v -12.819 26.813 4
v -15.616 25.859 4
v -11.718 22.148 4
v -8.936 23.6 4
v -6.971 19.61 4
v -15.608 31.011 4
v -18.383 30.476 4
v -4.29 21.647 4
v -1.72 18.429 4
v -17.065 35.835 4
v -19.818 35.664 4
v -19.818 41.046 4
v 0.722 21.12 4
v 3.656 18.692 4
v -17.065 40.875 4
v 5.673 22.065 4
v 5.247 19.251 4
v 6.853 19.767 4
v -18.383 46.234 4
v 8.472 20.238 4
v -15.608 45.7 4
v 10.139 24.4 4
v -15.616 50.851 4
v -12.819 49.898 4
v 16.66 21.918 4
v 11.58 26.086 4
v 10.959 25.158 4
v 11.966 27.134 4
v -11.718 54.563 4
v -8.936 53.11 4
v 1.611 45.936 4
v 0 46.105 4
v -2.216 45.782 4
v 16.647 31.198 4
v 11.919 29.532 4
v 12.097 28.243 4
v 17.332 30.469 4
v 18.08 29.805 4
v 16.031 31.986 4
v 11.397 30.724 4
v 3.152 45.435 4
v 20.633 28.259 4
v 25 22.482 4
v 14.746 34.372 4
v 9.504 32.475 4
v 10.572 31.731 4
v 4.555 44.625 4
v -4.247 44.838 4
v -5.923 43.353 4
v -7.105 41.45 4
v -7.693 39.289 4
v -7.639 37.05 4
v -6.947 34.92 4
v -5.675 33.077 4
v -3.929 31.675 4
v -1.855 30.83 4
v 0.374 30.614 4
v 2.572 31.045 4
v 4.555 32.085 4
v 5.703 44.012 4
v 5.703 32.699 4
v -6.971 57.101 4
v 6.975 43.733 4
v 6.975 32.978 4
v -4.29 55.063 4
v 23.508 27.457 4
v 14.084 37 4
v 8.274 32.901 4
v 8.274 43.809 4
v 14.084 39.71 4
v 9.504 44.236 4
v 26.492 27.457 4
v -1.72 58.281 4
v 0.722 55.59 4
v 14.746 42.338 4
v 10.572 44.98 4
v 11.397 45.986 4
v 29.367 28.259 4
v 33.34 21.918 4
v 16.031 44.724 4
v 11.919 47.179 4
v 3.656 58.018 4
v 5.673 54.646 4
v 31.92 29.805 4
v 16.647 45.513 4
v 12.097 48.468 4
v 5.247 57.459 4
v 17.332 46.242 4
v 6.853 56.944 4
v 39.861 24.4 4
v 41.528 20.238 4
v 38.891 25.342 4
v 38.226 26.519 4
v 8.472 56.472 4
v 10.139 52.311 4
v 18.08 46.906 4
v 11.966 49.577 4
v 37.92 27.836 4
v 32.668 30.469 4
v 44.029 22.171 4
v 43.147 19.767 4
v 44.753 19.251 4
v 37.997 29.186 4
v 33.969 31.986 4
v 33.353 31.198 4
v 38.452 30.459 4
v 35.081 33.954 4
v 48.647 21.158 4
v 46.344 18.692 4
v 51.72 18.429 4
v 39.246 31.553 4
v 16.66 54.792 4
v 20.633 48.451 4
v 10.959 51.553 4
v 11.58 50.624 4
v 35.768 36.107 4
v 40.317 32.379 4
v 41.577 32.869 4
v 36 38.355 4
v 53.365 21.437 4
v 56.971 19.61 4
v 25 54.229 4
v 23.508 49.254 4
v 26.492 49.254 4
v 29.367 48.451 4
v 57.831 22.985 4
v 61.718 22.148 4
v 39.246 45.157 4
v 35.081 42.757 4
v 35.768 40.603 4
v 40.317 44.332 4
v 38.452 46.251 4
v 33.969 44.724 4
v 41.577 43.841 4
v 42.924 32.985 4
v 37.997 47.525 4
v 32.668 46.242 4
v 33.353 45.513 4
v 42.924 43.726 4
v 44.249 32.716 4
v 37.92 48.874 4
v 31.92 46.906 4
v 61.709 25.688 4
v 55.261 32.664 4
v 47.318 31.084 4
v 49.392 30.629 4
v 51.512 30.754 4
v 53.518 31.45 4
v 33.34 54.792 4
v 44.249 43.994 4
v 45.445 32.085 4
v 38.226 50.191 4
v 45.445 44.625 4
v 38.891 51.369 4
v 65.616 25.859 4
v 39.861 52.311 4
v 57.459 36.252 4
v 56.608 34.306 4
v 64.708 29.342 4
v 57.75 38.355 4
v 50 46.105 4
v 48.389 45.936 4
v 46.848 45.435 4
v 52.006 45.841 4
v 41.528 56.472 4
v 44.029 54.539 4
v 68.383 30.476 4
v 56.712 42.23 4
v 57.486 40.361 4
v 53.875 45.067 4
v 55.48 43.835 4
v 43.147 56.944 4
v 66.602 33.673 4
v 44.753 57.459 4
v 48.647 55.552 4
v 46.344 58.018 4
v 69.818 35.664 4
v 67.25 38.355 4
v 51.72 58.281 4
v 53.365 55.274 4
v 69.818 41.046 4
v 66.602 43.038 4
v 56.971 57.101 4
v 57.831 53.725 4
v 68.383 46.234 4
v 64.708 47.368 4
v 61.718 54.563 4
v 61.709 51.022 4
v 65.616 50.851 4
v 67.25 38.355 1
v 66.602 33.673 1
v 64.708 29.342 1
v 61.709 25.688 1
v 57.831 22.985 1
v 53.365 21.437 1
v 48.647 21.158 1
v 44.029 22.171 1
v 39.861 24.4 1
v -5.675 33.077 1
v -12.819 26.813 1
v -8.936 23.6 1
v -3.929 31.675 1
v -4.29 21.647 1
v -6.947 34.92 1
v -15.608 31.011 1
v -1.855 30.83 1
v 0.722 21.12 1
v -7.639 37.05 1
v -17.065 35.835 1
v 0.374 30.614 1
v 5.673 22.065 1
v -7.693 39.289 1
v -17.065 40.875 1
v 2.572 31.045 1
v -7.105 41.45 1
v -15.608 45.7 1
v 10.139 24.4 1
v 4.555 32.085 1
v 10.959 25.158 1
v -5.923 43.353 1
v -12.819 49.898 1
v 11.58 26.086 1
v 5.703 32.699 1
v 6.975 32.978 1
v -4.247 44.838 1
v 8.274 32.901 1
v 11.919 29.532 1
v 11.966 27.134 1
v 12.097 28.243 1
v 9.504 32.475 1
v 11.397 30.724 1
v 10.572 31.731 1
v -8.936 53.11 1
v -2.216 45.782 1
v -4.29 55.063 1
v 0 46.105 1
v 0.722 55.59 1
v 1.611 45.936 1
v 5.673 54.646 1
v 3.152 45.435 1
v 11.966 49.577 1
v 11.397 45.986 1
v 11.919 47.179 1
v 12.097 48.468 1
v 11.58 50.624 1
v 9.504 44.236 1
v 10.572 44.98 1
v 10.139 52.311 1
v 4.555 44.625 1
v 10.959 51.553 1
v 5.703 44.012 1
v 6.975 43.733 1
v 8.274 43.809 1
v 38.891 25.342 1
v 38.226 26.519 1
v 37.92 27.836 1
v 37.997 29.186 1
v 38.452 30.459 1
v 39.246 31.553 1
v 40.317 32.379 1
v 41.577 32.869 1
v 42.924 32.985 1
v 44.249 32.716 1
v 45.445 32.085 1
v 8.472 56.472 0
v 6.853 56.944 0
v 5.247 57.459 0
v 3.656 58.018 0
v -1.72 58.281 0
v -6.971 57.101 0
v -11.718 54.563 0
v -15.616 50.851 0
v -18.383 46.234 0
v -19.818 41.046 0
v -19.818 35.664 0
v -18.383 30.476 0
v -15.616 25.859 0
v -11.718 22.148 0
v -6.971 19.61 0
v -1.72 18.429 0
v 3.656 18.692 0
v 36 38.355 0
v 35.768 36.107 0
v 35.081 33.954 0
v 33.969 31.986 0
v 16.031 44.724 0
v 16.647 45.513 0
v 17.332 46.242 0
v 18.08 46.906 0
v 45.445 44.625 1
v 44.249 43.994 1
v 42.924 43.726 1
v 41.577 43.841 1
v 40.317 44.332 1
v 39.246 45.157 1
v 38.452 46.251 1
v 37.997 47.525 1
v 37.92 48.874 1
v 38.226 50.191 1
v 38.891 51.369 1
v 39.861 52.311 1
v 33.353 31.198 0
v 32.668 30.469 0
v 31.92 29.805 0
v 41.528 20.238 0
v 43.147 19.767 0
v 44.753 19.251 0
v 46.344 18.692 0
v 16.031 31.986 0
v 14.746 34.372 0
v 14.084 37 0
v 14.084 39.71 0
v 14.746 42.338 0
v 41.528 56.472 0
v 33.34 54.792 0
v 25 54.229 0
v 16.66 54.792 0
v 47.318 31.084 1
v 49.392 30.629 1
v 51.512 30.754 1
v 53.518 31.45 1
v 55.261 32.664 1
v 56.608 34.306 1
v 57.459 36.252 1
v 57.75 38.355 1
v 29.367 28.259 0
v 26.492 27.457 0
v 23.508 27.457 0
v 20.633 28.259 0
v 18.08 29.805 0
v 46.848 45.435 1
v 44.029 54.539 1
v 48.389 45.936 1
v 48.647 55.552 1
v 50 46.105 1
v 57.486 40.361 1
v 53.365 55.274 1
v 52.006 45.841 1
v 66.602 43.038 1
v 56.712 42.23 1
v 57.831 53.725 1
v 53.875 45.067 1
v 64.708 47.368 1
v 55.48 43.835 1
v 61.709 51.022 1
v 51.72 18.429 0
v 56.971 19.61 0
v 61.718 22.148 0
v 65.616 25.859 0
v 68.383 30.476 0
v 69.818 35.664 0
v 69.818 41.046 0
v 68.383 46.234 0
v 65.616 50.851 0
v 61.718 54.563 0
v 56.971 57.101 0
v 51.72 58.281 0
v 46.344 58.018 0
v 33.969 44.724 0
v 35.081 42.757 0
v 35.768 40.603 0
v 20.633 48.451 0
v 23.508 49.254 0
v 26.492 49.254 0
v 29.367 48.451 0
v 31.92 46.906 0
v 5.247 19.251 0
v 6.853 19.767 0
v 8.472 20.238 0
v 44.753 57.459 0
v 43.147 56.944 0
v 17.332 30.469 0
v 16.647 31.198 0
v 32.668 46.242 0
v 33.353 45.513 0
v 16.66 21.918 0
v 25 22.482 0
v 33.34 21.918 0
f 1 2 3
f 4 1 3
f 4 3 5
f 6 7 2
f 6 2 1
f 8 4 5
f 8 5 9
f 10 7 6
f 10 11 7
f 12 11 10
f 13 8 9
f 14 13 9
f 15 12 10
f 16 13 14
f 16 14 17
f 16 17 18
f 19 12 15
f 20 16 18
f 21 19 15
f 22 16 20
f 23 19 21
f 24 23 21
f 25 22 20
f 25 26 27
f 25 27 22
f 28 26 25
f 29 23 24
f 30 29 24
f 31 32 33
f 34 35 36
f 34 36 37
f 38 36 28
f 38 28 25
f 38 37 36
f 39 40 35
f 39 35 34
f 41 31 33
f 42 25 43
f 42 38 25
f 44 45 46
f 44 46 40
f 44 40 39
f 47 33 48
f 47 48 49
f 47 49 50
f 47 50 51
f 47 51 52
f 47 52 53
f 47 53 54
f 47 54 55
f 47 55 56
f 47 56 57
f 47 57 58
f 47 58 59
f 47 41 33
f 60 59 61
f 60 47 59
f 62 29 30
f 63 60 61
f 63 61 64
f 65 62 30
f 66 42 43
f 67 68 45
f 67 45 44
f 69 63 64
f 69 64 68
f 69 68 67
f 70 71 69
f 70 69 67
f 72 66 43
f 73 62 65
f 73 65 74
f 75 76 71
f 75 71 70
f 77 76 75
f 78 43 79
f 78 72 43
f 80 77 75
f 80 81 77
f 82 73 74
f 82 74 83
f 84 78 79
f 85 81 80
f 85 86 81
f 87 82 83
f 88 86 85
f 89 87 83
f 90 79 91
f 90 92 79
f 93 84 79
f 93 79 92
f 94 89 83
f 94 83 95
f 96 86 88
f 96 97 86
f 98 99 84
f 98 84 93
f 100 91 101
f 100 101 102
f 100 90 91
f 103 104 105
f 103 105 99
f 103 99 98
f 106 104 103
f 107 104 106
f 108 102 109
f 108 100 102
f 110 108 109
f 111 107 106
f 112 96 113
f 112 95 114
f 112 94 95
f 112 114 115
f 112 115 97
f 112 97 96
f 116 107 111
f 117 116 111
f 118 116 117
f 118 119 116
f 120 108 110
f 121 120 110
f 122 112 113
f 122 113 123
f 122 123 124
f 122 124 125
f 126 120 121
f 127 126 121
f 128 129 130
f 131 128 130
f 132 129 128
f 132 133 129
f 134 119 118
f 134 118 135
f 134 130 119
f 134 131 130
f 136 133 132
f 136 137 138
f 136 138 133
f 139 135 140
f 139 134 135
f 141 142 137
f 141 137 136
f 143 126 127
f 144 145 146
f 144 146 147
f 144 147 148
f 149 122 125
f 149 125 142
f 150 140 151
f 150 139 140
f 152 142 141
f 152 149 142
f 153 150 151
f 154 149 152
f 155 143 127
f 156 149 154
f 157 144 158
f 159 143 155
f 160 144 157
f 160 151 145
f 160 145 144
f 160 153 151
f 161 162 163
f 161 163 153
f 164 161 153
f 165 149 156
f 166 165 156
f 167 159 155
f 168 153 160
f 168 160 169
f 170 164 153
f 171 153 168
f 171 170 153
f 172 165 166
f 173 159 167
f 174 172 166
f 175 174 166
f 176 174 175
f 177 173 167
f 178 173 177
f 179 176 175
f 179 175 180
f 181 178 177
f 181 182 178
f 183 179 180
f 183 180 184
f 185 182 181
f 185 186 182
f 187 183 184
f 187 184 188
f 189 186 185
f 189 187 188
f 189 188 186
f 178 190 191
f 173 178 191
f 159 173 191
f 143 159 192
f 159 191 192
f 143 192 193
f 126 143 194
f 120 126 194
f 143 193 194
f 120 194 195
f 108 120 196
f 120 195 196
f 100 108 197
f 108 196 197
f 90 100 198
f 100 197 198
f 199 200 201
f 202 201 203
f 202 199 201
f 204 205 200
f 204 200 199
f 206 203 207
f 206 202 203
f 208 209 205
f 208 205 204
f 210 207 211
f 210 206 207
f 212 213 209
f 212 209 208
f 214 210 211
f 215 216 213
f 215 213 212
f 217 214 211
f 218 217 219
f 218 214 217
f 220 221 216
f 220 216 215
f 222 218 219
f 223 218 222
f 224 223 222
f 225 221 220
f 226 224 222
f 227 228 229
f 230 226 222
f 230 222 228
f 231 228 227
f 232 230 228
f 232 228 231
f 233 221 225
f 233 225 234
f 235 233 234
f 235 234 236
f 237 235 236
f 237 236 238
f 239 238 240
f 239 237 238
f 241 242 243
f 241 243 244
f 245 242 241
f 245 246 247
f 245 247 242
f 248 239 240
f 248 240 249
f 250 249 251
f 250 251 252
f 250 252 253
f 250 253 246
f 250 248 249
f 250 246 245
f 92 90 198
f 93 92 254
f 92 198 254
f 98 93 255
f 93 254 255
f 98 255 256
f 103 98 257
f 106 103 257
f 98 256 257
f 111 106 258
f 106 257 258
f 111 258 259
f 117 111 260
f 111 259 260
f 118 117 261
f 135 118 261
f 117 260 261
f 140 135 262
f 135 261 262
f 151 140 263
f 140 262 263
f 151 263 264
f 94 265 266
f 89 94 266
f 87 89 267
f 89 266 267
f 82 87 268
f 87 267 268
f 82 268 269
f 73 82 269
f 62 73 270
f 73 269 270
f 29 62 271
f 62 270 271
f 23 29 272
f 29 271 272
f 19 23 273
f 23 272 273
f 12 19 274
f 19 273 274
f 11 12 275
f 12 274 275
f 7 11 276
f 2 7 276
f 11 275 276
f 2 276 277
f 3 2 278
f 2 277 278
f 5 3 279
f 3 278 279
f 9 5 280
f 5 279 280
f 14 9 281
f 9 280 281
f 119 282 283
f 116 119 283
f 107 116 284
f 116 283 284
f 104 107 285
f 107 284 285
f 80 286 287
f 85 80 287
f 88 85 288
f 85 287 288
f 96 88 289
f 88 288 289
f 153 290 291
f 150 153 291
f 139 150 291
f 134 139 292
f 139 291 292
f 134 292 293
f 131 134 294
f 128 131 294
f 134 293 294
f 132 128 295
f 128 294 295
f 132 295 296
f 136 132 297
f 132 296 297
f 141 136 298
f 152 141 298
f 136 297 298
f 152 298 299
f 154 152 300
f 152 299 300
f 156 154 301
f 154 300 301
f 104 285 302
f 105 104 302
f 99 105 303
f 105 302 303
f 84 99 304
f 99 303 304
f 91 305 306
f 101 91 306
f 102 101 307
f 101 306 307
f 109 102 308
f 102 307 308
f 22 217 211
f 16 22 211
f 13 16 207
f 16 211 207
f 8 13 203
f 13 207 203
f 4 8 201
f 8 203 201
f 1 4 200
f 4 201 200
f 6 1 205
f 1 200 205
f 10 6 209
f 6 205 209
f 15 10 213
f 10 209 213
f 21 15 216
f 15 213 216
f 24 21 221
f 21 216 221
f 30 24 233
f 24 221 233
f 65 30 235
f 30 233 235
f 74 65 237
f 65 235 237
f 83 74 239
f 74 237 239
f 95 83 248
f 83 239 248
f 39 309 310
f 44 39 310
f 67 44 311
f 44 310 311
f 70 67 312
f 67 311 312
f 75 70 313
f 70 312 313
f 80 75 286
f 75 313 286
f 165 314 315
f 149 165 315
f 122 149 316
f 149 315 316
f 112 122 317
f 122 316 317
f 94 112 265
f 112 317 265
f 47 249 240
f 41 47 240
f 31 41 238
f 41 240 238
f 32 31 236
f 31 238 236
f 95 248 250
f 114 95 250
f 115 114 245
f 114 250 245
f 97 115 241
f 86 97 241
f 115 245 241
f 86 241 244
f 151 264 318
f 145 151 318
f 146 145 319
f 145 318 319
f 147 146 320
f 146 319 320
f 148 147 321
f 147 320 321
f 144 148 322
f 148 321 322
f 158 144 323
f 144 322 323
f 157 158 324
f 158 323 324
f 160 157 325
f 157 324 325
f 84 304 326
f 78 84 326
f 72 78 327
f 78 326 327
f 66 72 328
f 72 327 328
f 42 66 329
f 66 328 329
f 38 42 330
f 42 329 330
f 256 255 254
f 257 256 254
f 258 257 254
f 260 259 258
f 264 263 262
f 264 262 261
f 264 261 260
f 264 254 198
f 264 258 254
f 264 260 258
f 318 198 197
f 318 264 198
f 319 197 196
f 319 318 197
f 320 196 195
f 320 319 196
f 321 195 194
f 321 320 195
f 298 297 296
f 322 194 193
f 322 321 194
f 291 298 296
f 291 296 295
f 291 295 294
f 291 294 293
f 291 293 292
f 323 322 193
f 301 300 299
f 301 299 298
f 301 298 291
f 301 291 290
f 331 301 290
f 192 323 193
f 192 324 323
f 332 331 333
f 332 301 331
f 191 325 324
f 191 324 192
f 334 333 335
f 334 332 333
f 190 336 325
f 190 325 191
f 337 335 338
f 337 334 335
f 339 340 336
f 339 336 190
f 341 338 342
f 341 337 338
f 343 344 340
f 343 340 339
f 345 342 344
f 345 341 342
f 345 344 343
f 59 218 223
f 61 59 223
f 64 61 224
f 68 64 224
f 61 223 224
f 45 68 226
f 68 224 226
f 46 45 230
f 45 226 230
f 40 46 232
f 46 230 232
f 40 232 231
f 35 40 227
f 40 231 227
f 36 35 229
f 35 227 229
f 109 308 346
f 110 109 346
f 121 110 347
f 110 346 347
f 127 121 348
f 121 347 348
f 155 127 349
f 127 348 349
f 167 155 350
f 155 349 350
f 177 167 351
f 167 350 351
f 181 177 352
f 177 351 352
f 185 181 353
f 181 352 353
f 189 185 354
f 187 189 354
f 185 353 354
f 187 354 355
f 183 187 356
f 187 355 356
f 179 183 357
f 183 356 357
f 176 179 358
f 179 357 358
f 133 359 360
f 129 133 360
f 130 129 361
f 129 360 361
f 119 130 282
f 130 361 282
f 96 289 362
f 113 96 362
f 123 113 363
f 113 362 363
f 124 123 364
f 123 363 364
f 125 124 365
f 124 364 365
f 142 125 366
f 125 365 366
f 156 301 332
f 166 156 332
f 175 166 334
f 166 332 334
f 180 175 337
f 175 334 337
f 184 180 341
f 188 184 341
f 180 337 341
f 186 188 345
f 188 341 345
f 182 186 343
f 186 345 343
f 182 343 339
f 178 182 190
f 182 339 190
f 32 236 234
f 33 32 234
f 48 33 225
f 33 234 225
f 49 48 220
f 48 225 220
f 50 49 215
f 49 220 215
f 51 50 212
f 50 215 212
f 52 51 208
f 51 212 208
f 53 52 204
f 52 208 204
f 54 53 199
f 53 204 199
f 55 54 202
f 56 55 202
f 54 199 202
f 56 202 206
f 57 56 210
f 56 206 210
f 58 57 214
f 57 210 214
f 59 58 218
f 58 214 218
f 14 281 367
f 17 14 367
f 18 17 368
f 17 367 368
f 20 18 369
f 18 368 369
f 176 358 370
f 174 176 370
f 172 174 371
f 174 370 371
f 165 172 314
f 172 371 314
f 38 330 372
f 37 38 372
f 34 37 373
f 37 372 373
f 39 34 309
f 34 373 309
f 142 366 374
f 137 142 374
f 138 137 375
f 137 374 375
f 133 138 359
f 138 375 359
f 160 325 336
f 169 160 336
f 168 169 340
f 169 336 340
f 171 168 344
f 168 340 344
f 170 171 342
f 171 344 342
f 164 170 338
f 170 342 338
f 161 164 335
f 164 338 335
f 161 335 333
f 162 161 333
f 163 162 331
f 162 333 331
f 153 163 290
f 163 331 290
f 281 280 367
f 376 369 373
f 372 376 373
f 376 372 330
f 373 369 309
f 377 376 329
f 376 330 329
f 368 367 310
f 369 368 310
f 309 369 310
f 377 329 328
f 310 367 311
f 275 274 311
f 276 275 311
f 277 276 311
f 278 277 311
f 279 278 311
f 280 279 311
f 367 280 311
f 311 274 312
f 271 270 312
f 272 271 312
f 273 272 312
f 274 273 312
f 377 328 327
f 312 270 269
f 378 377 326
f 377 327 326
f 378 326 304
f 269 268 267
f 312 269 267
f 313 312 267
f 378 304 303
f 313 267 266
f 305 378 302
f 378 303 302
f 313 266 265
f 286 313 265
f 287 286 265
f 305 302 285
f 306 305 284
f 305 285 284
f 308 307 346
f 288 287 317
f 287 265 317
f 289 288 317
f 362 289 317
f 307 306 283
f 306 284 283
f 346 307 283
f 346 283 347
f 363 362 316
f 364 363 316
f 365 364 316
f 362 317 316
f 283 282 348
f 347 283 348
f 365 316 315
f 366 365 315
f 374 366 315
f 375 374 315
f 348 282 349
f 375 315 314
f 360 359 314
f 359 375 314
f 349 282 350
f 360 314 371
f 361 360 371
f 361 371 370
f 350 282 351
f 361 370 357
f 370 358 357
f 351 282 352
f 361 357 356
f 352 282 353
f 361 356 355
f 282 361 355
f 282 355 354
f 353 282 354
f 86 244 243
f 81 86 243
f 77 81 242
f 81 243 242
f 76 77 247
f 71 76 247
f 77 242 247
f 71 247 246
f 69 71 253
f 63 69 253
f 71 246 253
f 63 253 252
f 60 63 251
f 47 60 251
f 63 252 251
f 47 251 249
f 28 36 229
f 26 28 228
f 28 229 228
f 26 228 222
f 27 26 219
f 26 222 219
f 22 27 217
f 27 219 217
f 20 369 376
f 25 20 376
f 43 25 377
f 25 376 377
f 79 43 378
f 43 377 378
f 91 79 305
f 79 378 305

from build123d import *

# Parameters (mm, degrees)
F1_DEPTH = 4
F2_DEPTH = 1


with BuildPart() as f1:
    # F0 (on Top) → F1 (new body)
    with BuildSketch(Plane.XY):
        with BuildLine():
            ThreePointArc((33.96875, 44.7240123715), (35.4798914594, 41.6976549267), (36, 38.3552194374))
            ThreePointArc((36, 38.3552194374), (35.4798914594, 35.0127839481), (33.96875, 31.9864265033))
            ThreePointArc((33.96875, 31.9864265033), (34.890304672, 30.0329837344), (36.04875, 28.2100174464))
            ThreePointArc((36.04875, 28.2100174464), (38.9773253879, 32.9114730252), (40, 38.3552194374))
            ThreePointArc((40, 38.3552194374), (38.9773253879, 43.7989658495), (36.04875, 48.5004214283))
            ThreePointArc((36.04875, 48.5004214283), (34.890304672, 46.6774551404), (33.96875, 44.7240123715))
        make_face()
        with BuildLine():
            ThreePointArc((31.92, 46.9058685355), (33.0189287452, 45.8849459782), (33.96875, 44.7240123715))
            ThreePointArc((33.96875, 44.7240123715), (34.890304672, 46.6774551404), (36.04875, 48.5004214283))
            ThreePointArc((36.04875, 48.5004214283), (35.0671824784, 49.4751041915), (34, 50.3552194374))
            ThreePointArc((34, 50.3552194374), (32.8729423014, 48.6830408238), (31.92, 46.9058685355))
        make_face()
        with BuildLine():
            ThreePointArc((36.04875, 28.2100174464), (34.890304672, 30.0329837344), (33.96875, 31.9864265033))
            ThreePointArc((33.96875, 31.9864265033), (33.0189287452, 30.8254928966), (31.92, 29.8045703392))
            ThreePointArc((31.92, 29.8045703392), (32.8729423014, 28.027398051), (34, 26.3552194374))
            ThreePointArc((34, 26.3552194374), (35.0671824784, 27.2353346832), (36.04875, 28.2100174464))
        make_face()
        with BuildLine():
            ThreePointArc((18.08, 46.9058685355), (25, 49.3552194374), (31.92, 46.9058685355))
            ThreePointArc((31.92, 46.9058685355), (32.8729423014, 48.6830408238), (34, 50.3552194374))
            ThreePointArc((34, 50.3552194374), (25, 53.3552194374), (16, 50.3552194374))
            ThreePointArc((16, 50.3552194374), (17.1270576986, 48.6830408238), (18.08, 46.9058685355))
        make_face()
        with BuildLine():
            ThreePointArc((39.8607042186, 52.31076246), (37.804989803, 50.5553926449), (36.04875, 48.5004214283))
            ThreePointArc((36.04875, 48.5004214283), (38.9773253879, 43.7989658495), (40, 38.3552194374))
            ThreePointArc((40, 38.3552194374), (38.9773253879, 32.9114730252), (36.04875, 28.2100174464))
            ThreePointArc((36.04875, 28.2100174464), (37.8049899077, 26.1550461251), (39.8607044582, 24.3996762406))
            ThreePointArc((39.8607044582, 24.3996762406), (38.8098535793, 31.0344868958), (45.4446642345, 32.0853377748))
            ThreePointArc((45.4446642345, 32.0853377748), (42.25, 38.3552195837), (45.4446644712, 44.625101272))
            ThreePointArc((45.4446644712, 44.625101272), (38.8098537523, 45.6759517408), (39.8607042186, 52.31076246))
        make_face()
        with BuildLine():
            ThreePointArc((34, 50.3552194374), (35.0671824784, 49.4751041915), (36.04875, 48.5004214283))
            ThreePointArc((36.04875, 48.5004214283), (37.804989803, 50.5553926449), (39.8607042186, 52.31076246))
            ThreePointArc((39.8607042186, 52.31076246), (57.8313360218, 53.7250820299), (67.25, 38.3552194374))
            ThreePointArc((67.25, 38.3552194374), (57.8313361537, 22.985356912), (39.8607044582, 24.3996762406))
            ThreePointArc((39.8607044582, 24.3996762406), (37.8049899077, 26.1550461251), (36.04875, 28.2100174464))
            ThreePointArc((36.04875, 28.2100174464), (35.0671824784, 27.2353346832), (34, 26.3552194374))
            ThreePointArc((34, 26.3552194374), (37.3874296651, 22.8335227019), (41.5277360562, 20.2383559211))
            ThreePointArc((41.5277360562, 20.2383559211), (43.9514682435, 19.5144497823), (46.3436548255, 18.6922812041))
            ThreePointArc((46.3436548255, 18.6922812041), (62.7842304522, 22.9746000823), (70, 38.3552194374))
            ThreePointArc((70, 38.3552194374), (62.7842304522, 53.7358387924), (46.3436548255, 58.0181576706))
            ThreePointArc((46.3436548255, 58.0181576706), (43.9514682435, 57.1959890924), (41.5277360562, 56.4720829536))
            ThreePointArc((41.5277360562, 56.4720829536), (37.3874296651, 53.8769161728), (34, 50.3552194374))
        make_face()
        with BuildLine():
            ThreePointArc((34, 26.3552194374), (32.8729423014, 28.027398051), (31.92, 29.8045703392))
            ThreePointArc((31.92, 29.8045703392), (25, 27.3552194374), (18.08, 29.8045703392))
            ThreePointArc((18.08, 29.8045703392), (17.1270576986, 28.027398051), (16, 26.3552194374))
            ThreePointArc((16, 26.3552194374), (25, 23.3552194374), (34, 26.3552194374))
        make_face()
        with BuildLine():
            ThreePointArc((16.03125, 44.7240123715), (16.9810712548, 45.8849459782), (18.08, 46.9058685355))
            ThreePointArc((18.08, 46.9058685355), (17.1270576986, 48.6830408238), (16, 50.3552194374))
            ThreePointArc((16, 50.3552194374), (14.9328175216, 49.4751041915), (13.95125, 48.5004214283))
            ThreePointArc((13.95125, 48.5004214283), (15.109695328, 46.6774551404), (16.03125, 44.7240123715))
        make_face()
        with BuildLine():
            ThreePointArc((16, 50.3552194374), (25, 53.3552194374), (34, 50.3552194374))
            ThreePointArc((34, 50.3552194374), (37.3874296651, 53.8769161728), (41.5277360562, 56.4720829536))
            ThreePointArc((41.5277360562, 56.4720829536), (25, 54.228538177), (8.4722639438, 56.4720829536))
            ThreePointArc((8.4722639438, 56.4720829536), (12.6125703349, 53.8769161728), (16, 50.3552194374))
        make_face()
        with BuildLine():
            ThreePointArc((16, 26.3552194374), (17.1270576986, 28.027398051), (18.08, 29.8045703392))
            ThreePointArc((18.08, 29.8045703392), (16.9810712548, 30.8254928966), (16.03125, 31.9864265033))
            ThreePointArc((16.03125, 31.9864265033), (15.109695328, 30.0329837344), (13.95125, 28.2100174464))
            ThreePointArc((13.95125, 28.2100174464), (14.9328175216, 27.2353346832), (16, 26.3552194374))
        make_face()
        with BuildLine():
            ThreePointArc((41.5277360562, 20.2383559211), (37.3874296651, 22.8335227019), (34, 26.3552194374))
            ThreePointArc((34, 26.3552194374), (25, 23.3552194374), (16, 26.3552194374))
            ThreePointArc((16, 26.3552194374), (12.6125703349, 22.8335227019), (8.4722639438, 20.2383559211))
            ThreePointArc((8.4722639438, 20.2383559211), (25, 22.4819006978), (41.5277360562, 20.2383559211))
        make_face()
        with BuildLine():
            ThreePointArc((16.03125, 31.9864265033), (14, 38.3552194374), (16.03125, 44.7240123715))
            ThreePointArc((16.03125, 44.7240123715), (15.109695328, 46.6774551404), (13.95125, 48.5004214283))
            ThreePointArc((13.95125, 48.5004214283), (10, 38.3552194374), (13.95125, 28.2100174464))
            ThreePointArc((13.95125, 28.2100174464), (15.109695328, 30.0329837344), (16.03125, 31.9864265033))
        make_face()
        with BuildLine():
            ThreePointArc((13.95125, 48.5004214283), (14.9328175216, 49.4751041915), (16, 50.3552194374))
            ThreePointArc((16, 50.3552194374), (12.6125703349, 53.8769161728), (8.4722639438, 56.4720829536))
            ThreePointArc((8.4722639438, 56.4720829536), (6.0485317565, 57.1959890924), (3.6563451745, 58.0181576706))
            ThreePointArc((3.6563451745, 58.0181576706), (-20, 38.3552194374), (3.6563451745, 18.6922812041))
            ThreePointArc((3.6563451745, 18.6922812041), (6.0485317565, 19.5144497823), (8.4722639438, 20.2383559211))
            ThreePointArc((8.4722639438, 20.2383559211), (12.6125703349, 22.8335227019), (16, 26.3552194374))
            ThreePointArc((16, 26.3552194374), (14.9328175216, 27.2353346832), (13.95125, 28.2100174464))
            ThreePointArc((13.95125, 28.2100174464), (12.1950101323, 26.1550461651), (10.1392956333, 24.3996763071))
            ThreePointArc((10.1392956333, 24.3996763071), (-17.25, 38.3552194393), (10.1392956365, 52.3107625653))
            ThreePointArc((10.1392956365, 52.3107625653), (12.1950101337, 50.5553927082), (13.95125, 48.5004214283))
        make_face()
        with BuildLine():
            ThreePointArc((50, 46.1052194374), (47.6051183973, 45.7259074724), (45.4446644712, 44.625101272))
            ThreePointArc((45.4446644712, 44.625101272), (42.25, 38.3552195837), (45.4446642345, 32.0853377748))
            ThreePointArc((45.4446642345, 32.0853377748), (53.5184263398, 31.449918858), (57.75, 38.3552194374))
            ThreePointArc((57.75, 38.3552194374), (55.4800775542, 43.8352969916), (50, 46.1052194374))
        make_face()
        with BuildLine():
            ThreePointArc((13.95125, 28.2100174464), (10, 38.3552194374), (13.95125, 48.5004214283))
            ThreePointArc((13.95125, 48.5004214283), (12.1950101337, 50.5553927082), (10.1392956365, 52.3107625653))
            ThreePointArc((10.1392956365, 52.3107625653), (11.5795966532, 50.6243867219), (12.0973156537, 48.4679318671))
            ThreePointArc((12.0973156537, 48.4679318671), (9.503770504, 44.2356508652), (4.5553356627, 44.6251011747))
            ThreePointArc((4.5553356627, 44.6251011747), (6.9053005505, 41.8736458338), (7.75, 38.3552194374))
            ThreePointArc((7.75, 38.3552194374), (6.9053005928, 34.8367931239), (4.5553358133, 32.0853378094))
            ThreePointArc((4.5553358133, 32.0853378094), (9.5037705869, 32.4747879673), (12.0973156537, 28.2425070077))
            ThreePointArc((12.0973156537, 28.2425070077), (11.5795966523, 26.0860521511), (10.1392956333, 24.3996763071))
            ThreePointArc((10.1392956333, 24.3996763071), (12.1950101323, 26.1550461651), (13.95125, 28.2100174464))
        make_face()
        with BuildLine():
            ThreePointArc((7.75, 38.3552194374), (6.9053005505, 41.8736458338), (4.5553356627, 44.6251011747))
            ThreePointArc((4.5553356627, 44.6251011747), (2.3948816814, 45.7259074468), (0, 46.1052194374))
            ThreePointArc((0, 46.1052194374), (-7.3706879807, 35.9603376675), (4.5553358133, 32.0853378094))
            ThreePointArc((4.5553358133, 32.0853378094), (6.9053005928, 34.8367931239), (7.75, 38.3552194374))
        make_face()
    extrude(amount=F1_DEPTH)

    # F0 (on Top) → F2 (join)
    with BuildSketch(Plane.XY):
        with BuildLine():
            ThreePointArc((67.25, 38.3552194374), (57.8313360218, 53.7250820299), (39.8607042186, 52.31076246))
            ThreePointArc((39.8607042186, 52.31076246), (44.8091391214, 52.7002129073), (47.4026843463, 48.4679318671))
            ThreePointArc((47.4026843463, 48.4679318671), (46.8849653857, 46.3114770905), (45.4446644712, 44.625101272))
            ThreePointArc((45.4446644712, 44.625101272), (47.6051183973, 45.7259074724), (50, 46.1052194374))
            ThreePointArc((50, 46.1052194374), (55.4800775542, 43.8352969916), (57.75, 38.3552194374))
            ThreePointArc((57.75, 38.3552194374), (53.5184263398, 31.449918858), (45.4446642345, 32.0853377748))
            ThreePointArc((45.4446642345, 32.0853377748), (46.8849653193, 30.3989619146), (47.4026843463, 28.2425070077))
            ThreePointArc((47.4026843463, 28.2425070077), (44.8091392533, 24.0102260347), (39.8607044582, 24.3996762406))
            ThreePointArc((39.8607044582, 24.3996762406), (57.8313361537, 22.985356912), (67.25, 38.3552194374))
        make_face()
        with BuildLine():
            ThreePointArc((47.4026843463, 48.4679318671), (44.8091391214, 52.7002129073), (39.8607042186, 52.31076246))
            ThreePointArc((39.8607042186, 52.31076246), (38.8098537523, 45.6759517408), (45.4446644712, 44.625101272))
            ThreePointArc((45.4446644712, 44.625101272), (46.8849653857, 46.3114770905), (47.4026843463, 48.4679318671))
        make_face()
        with BuildLine():
            ThreePointArc((45.4446642345, 32.0853377748), (38.8098535793, 31.0344868958), (39.8607044582, 24.3996762406))
            ThreePointArc((39.8607044582, 24.3996762406), (44.8091392533, 24.0102260347), (47.4026843463, 28.2425070077))
            ThreePointArc((47.4026843463, 28.2425070077), (46.8849653193, 30.3989619146), (45.4446642345, 32.0853377748))
        make_face()
        with BuildLine():
            ThreePointArc((4.5553356627, 44.6251011747), (3.5044849583, 51.2599118539), (10.1392956365, 52.3107625653))
            ThreePointArc((10.1392956365, 52.3107625653), (-17.25, 38.3552194393), (10.1392956333, 24.3996763071))
            ThreePointArc((10.1392956333, 24.3996763071), (3.5044849025, 25.4505270977), (4.5553358133, 32.0853378094))
            ThreePointArc((4.5553358133, 32.0853378094), (-7.3706879807, 35.9603376675), (0, 46.1052194374))
            ThreePointArc((0, 46.1052194374), (2.3948816814, 45.7259074468), (4.5553356627, 44.6251011747))
        make_face()
        with BuildLine():
            ThreePointArc((12.0973156537, 48.4679318671), (11.5795966532, 50.6243867219), (10.1392956365, 52.3107625653))
            ThreePointArc((10.1392956365, 52.3107625653), (3.5044849583, 51.2599118539), (4.5553356627, 44.6251011747))
            ThreePointArc((4.5553356627, 44.6251011747), (9.503770504, 44.2356508652), (12.0973156537, 48.4679318671))
        make_face()
        with BuildLine():
            ThreePointArc((4.5553358133, 32.0853378094), (3.5044849025, 25.4505270977), (10.1392956333, 24.3996763071))
            ThreePointArc((10.1392956333, 24.3996763071), (11.5795966523, 26.0860521511), (12.0973156537, 28.2425070077))
            ThreePointArc((12.0973156537, 28.2425070077), (9.5037705869, 32.4747879673), (4.5553358133, 32.0853378094))
        make_face()
    extrude(amount=F2_DEPTH)


solid = f1.part
